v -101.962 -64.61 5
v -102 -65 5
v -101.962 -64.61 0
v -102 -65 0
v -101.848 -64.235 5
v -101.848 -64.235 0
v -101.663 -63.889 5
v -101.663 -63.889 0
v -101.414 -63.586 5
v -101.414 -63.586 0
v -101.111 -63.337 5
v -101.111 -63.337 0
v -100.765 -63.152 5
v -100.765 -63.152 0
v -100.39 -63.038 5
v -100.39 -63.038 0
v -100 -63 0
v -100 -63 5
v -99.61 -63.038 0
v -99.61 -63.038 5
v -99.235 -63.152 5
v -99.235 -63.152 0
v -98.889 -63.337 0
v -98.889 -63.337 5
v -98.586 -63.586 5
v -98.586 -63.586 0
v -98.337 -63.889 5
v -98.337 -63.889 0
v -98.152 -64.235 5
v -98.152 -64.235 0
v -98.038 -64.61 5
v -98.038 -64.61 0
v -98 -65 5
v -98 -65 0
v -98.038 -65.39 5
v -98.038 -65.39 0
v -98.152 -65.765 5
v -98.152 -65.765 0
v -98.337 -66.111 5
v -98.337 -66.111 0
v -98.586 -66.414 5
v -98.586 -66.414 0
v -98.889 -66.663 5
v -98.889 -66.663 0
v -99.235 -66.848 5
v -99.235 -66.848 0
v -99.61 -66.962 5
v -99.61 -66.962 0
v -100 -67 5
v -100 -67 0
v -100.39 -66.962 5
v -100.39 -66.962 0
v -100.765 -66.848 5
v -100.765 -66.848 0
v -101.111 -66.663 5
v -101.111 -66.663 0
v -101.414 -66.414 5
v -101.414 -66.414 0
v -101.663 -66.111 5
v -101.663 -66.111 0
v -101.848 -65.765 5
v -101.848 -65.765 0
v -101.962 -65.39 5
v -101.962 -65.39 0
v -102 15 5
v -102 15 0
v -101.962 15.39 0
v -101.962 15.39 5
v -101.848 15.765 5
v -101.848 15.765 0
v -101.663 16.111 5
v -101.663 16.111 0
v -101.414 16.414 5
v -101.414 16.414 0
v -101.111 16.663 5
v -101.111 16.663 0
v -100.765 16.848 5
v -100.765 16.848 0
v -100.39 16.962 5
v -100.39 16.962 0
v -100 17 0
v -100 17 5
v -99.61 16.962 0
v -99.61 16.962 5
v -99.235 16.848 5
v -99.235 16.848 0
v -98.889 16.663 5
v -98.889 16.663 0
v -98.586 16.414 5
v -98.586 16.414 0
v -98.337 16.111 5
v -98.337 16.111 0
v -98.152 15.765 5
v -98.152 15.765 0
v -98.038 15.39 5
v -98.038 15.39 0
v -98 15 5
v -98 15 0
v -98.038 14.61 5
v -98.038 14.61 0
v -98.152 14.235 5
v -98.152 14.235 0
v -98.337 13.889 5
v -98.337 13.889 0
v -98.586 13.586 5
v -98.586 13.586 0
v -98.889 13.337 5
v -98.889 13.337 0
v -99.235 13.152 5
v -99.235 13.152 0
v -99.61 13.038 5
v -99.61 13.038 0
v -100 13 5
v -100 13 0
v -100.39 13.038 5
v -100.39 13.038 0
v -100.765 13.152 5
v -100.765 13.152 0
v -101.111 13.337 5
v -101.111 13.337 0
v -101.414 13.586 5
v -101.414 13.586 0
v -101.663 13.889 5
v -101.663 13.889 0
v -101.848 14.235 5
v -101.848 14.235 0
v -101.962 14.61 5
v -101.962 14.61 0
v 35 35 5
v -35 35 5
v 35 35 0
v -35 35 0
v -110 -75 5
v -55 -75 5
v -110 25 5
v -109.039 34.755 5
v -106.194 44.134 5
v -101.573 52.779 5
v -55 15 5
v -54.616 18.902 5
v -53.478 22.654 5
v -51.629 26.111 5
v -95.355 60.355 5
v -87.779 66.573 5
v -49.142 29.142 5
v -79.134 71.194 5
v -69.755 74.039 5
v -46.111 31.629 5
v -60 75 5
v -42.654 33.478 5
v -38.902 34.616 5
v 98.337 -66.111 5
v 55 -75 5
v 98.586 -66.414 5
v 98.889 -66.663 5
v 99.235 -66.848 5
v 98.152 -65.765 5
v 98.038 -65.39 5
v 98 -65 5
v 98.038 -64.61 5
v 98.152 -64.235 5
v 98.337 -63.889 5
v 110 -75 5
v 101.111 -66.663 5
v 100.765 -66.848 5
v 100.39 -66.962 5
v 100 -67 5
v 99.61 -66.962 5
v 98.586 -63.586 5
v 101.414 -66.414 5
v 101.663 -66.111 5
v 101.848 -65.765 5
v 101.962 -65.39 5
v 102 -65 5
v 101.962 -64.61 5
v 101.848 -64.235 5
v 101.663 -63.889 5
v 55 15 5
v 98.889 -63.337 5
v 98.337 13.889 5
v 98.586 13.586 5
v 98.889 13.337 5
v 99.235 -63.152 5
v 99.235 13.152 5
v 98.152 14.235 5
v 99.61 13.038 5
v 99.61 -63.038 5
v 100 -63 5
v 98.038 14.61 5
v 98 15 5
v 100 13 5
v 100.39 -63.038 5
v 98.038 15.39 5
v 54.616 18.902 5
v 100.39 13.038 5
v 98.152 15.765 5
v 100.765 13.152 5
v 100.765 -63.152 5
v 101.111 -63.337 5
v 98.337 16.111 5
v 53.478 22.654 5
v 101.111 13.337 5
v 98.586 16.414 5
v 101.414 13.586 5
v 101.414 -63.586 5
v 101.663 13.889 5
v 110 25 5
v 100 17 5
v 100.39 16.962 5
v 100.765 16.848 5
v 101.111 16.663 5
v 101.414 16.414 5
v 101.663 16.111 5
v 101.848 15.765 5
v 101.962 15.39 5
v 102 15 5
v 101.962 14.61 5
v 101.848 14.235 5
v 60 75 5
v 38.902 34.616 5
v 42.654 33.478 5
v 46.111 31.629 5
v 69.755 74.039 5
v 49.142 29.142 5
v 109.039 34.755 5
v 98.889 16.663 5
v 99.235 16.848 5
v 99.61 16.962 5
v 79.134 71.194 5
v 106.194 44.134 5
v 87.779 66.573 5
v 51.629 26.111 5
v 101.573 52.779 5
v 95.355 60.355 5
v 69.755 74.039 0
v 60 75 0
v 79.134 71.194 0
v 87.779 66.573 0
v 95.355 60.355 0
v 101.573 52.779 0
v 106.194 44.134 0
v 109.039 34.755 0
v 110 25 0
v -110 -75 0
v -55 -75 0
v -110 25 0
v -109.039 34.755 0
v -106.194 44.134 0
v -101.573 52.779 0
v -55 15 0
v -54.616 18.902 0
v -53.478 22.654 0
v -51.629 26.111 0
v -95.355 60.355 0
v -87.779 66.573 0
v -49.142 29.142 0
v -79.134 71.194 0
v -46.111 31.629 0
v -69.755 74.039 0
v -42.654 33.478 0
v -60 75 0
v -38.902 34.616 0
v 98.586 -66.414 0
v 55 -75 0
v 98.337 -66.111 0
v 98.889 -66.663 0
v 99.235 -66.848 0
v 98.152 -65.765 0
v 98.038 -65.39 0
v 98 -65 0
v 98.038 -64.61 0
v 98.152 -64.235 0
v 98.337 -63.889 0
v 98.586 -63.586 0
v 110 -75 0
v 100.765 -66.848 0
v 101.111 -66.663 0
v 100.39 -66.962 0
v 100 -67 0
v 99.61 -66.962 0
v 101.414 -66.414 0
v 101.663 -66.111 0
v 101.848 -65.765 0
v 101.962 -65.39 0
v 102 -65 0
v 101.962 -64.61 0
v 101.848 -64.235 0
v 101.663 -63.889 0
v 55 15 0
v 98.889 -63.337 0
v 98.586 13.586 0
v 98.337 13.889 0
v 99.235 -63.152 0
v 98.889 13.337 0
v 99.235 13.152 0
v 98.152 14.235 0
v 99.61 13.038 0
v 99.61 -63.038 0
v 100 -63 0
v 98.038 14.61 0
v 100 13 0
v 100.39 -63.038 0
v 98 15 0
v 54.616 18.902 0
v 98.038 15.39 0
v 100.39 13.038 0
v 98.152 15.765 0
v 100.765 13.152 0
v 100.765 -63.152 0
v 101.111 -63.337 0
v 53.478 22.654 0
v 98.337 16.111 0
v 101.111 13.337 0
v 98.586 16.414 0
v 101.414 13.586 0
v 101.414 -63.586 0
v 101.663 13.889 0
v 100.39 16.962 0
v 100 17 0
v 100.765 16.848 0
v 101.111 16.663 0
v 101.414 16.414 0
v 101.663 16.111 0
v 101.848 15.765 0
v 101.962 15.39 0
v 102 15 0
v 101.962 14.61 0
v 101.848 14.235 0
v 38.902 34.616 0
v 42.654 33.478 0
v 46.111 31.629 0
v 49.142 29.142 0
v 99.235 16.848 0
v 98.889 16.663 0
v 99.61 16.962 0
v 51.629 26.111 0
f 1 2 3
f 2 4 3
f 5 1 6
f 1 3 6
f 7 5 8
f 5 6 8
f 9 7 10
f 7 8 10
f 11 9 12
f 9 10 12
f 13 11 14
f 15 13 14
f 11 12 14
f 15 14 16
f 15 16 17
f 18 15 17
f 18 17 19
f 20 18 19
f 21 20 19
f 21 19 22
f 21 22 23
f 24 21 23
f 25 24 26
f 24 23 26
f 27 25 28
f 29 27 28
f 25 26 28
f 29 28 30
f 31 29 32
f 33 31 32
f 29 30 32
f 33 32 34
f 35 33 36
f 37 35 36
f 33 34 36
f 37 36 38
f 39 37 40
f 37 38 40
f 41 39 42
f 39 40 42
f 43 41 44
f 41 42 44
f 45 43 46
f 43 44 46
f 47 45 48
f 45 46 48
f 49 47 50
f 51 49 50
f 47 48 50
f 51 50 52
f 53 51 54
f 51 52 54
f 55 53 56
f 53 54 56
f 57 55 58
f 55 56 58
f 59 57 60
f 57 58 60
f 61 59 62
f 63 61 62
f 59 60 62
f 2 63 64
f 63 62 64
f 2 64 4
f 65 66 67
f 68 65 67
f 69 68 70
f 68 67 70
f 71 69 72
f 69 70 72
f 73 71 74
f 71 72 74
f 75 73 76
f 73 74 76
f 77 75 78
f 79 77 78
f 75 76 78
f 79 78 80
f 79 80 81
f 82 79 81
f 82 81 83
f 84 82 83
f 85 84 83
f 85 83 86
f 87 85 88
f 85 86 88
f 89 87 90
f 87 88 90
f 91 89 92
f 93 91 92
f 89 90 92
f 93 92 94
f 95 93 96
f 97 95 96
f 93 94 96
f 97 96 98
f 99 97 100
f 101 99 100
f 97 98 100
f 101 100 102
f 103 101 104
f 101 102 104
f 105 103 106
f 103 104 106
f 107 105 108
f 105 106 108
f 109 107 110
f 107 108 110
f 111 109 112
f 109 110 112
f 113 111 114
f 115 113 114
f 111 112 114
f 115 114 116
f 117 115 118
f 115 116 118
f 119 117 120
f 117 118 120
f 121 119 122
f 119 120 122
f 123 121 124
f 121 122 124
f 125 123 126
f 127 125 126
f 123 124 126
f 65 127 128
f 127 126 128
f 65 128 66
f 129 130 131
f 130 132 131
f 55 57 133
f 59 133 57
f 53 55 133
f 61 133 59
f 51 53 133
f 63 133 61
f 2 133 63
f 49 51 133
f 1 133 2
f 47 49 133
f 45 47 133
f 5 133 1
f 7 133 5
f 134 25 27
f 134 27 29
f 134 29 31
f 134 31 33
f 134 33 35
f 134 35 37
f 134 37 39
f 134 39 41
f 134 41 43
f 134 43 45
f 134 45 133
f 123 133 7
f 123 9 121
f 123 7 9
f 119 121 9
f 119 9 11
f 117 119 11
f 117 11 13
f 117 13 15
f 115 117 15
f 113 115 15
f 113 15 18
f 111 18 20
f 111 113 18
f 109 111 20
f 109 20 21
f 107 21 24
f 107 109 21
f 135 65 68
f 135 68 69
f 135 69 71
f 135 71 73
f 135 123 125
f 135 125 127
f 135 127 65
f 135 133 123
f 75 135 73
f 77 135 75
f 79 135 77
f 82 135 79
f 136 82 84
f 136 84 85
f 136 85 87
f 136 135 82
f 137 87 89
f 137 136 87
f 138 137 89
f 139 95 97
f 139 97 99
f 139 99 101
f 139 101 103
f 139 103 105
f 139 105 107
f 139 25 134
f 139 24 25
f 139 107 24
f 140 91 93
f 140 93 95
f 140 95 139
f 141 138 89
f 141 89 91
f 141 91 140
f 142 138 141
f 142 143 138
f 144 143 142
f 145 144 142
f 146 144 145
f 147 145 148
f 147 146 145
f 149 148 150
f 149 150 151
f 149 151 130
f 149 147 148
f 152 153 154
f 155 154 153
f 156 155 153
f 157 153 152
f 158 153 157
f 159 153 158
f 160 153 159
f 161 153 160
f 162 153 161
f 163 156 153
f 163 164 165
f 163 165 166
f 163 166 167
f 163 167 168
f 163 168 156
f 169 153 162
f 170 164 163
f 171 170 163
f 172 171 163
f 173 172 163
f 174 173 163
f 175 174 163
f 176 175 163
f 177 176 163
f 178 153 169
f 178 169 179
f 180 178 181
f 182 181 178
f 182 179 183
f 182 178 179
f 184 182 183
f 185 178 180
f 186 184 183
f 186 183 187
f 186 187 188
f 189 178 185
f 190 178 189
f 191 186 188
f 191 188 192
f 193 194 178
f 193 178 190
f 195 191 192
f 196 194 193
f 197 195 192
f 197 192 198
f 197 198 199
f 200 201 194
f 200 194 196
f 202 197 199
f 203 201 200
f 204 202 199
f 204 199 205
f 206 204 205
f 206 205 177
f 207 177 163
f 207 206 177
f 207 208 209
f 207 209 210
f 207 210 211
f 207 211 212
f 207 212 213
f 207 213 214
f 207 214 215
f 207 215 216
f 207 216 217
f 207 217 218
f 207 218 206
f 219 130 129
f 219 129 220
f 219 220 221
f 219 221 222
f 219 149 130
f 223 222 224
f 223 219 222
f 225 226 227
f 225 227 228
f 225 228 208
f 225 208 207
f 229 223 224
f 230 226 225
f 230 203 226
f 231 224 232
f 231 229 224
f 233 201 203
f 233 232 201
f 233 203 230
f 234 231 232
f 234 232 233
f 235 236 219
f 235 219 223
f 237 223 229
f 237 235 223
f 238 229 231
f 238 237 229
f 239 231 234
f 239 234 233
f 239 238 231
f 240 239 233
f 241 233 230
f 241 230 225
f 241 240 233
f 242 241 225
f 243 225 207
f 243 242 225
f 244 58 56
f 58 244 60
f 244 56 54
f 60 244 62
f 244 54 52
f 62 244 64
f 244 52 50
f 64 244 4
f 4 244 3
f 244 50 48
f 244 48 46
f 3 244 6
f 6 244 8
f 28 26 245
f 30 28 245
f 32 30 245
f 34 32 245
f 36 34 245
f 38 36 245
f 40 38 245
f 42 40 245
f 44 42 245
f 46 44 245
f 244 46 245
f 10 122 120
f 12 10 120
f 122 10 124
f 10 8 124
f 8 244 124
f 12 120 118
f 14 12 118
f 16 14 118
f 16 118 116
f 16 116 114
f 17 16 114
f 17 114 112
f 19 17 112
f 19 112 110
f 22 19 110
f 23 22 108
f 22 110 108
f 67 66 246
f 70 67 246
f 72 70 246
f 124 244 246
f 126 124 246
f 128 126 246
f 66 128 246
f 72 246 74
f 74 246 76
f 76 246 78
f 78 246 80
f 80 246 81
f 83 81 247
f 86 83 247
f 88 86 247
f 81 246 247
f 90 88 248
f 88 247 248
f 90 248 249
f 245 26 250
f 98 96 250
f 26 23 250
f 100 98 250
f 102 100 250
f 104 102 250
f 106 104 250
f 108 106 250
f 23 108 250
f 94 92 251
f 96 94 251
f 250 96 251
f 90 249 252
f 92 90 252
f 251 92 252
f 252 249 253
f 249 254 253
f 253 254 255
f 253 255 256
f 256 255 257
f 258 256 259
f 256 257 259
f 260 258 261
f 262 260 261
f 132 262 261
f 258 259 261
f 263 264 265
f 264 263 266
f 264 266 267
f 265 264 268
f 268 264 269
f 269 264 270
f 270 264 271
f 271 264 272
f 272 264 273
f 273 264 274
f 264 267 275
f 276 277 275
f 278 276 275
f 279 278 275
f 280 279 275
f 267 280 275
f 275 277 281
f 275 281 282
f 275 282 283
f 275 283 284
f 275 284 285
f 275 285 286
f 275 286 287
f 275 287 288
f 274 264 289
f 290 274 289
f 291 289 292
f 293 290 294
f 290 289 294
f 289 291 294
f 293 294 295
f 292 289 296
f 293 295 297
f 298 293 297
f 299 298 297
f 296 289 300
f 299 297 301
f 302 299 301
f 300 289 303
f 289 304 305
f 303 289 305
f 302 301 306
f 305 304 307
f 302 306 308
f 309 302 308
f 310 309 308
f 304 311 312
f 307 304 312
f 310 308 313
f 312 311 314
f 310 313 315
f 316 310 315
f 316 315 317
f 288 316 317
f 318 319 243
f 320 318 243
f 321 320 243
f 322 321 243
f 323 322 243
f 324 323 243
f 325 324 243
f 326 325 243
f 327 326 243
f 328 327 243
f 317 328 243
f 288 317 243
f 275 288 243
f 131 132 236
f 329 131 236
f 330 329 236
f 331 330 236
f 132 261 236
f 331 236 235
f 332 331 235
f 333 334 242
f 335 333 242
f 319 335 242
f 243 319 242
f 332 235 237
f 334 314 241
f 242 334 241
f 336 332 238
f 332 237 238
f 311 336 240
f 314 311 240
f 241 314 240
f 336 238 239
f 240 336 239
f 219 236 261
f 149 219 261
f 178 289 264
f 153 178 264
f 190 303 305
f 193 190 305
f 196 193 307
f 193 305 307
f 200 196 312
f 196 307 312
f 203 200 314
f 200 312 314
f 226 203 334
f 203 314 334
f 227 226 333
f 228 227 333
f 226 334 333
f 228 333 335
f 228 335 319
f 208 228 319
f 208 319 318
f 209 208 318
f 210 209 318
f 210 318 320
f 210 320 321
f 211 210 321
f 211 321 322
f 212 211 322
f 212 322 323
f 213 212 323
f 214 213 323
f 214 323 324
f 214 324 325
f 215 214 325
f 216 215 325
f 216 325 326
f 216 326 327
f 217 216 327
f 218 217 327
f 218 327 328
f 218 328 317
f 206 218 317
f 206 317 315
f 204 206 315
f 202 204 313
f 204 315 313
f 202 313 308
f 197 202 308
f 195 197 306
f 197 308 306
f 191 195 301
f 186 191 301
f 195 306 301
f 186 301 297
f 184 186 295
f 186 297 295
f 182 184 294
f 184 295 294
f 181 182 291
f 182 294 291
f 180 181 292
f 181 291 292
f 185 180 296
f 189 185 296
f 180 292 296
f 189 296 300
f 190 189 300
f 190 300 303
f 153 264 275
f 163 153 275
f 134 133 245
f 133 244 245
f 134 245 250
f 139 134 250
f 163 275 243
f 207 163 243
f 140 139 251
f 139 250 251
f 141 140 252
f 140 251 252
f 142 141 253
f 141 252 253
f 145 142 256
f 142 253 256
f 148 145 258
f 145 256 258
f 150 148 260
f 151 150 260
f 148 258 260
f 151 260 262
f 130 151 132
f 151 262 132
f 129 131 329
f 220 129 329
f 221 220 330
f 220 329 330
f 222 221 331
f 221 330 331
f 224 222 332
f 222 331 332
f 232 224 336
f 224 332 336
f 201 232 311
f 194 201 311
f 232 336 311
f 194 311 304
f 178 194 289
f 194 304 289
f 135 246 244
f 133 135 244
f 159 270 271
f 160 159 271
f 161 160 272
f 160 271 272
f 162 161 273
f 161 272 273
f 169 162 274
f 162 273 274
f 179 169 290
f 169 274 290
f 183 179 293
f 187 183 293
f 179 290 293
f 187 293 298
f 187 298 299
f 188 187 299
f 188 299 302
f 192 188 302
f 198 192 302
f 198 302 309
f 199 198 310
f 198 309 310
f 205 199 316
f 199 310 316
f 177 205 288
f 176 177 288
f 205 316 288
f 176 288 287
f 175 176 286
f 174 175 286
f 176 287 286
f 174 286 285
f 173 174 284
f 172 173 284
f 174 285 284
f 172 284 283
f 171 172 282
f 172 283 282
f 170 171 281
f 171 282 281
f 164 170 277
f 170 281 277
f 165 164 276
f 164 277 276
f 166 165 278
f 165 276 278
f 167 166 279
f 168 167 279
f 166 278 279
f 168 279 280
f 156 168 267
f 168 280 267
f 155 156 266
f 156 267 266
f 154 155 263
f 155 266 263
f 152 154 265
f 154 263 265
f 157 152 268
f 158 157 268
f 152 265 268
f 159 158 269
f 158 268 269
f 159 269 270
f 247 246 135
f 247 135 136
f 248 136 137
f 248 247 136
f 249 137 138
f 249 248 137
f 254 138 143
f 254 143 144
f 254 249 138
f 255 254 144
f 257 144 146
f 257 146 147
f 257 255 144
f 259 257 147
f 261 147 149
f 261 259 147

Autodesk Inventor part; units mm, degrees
ref_plane "YZ Plane" through (0, 0, 0) normal (1, 0, 0) x (0, 1, 0)
ref_plane "XZ Plane" through (0, 0, 0) normal (0, 1, 0) x (-1, 0, 0)
ref_plane "XY Plane" through (0, 0, 0) normal (0, 0, 1) x (1, 0, 0)
sketch "Sketch1" plane through (0, 0, 0) normal (0, 0, 1) x (1, 0, 0)
  line L0 (-110, -75) -> (110, -75)
  line L1 (110, -75) -> (110, 75)
  line L2 (110, 75) -> (-110, 75)
  line L3 (-110, 75) -> (-110, -75)
  line L4 (-110, -75) -> (110, 75) construction
  line L5 (110, -75) -> (-110, 75) construction
  point P0 (0, 0)
  dimension "d0" = 220
  dimension "d1" = 150
extrude "Extrusion1" add sketch "Sketch1" along normal blind 5
sketch "Sketch2" plane through (0, 0, 0) normal (0, 0, -1) x (-1, 0, 0)
  circle A0 centre (100, 15) radius 2 projected
  circle A1 centre (-100, -65) radius 2 projected
  circle A2 centre (100, -65) radius 2 projected
  circle A3 centre (-100, 15) radius 2 projected
  line L0 (-110, -75) -> (-80, -75) projected
  line L1 (-80, -75) -> (-80, -70) projected
  line L2 (-95, -70) -> (-80, -70) projected
  line L3 (-95, -70) -> (-95, -60) projected
  line L4 (-95, -60) -> (-105, -60) projected
  line L5 (-105, -60) -> (-105, 10) projected
  line L6 (-105, 10) -> (-95, 10) projected
  line L7 (-95, 10) -> (-95, 20) projected
  line L8 (-95, 20) -> (-105, 20) projected
  line L9 (-105, 20) -> (-105, 25) projected
  arc A4 (-60, 70) -> (-105, 25) centre (-60, 25) ccw projected
  line L10 (-60, 70) -> (60, 70) projected
  arc A5 (105, 25) -> (60, 70) centre (60, 25) ccw projected
  line L11 (105, 20) -> (105, 25) projected
  line L12 (105, 20) -> (95, 20) projected
  line L13 (95, 20) -> (95, 10) projected
  line L14 (95, 10) -> (105, 10) projected
  line L15 (105, -60) -> (105, 10) projected
  line L16 (105, -60) -> (95, -60) projected
  line L17 (95, -60) -> (95, -70) projected
  line L18 (80, -70) -> (95, -70) projected
  line L19 (80, -70) -> (80, -75) projected
  line L20 (80, -75) -> (110, -75) projected
  line L21 (110, -75) -> (110, 25) projected
  arc A6 (110, 25) -> (60, 75) centre (60, 25) ccw projected
  line L22 (-60, 75) -> (60, 75) projected
  arc A7 (-60, 75) -> (-110, 25) centre (-60, 25) ccw projected
  line L23 (-110, -75) -> (-110, 25) projected
  line L24 (-110, -75) -> (110, -75)
  line L25 (110, -75) -> (110, 75)
  line L26 (110, 75) -> (-110, 75)
  line L27 (-110, 75) -> (-110, -75)
  line L28 (-110, -75) -> (110, 75) construction
  line L29 (110, -75) -> (-110, 75) construction
  point P0 (0, 0)
  point P1 (-110, 25)
extrude "Extrusion2" cut sketch "Sketch2" against normal blind 5 contours A0 | A1 | A2 | A3 | L27 L26 A7 | L26 L25 A6
sketch "Sketch4" plane through (0, 0, 0) normal (0, 0, -1) x (-1, 0, 0)
  line L0 (-55, -75) -> (55, -75)
  line L1 (55, -75) -> (55, 15)
  line L2 (35, 35) -> (-35, 35)
  line L3 (-55, 15) -> (-55, -75)
  line L4 (110, -75) -> (-110, -75) projected
  arc A0 (-35, 35) -> (-55, 15) centre (-35, 15) ccw
  arc A1 (55, 15) -> (35, 35) centre (35, 15) ccw
  point P0 (0, 0)
  point P1 (55, 35)
  point P2 (-55, 35)
  dimension "d12" = 110
  dimension "d13" = 110
  dimension "d14" = 55
  dimension "d15" = 20
extrude "Extrusion4" cut sketch "Sketch4" against normal blind 5
properties part number "speaker_front" material "ABS Plastic"
